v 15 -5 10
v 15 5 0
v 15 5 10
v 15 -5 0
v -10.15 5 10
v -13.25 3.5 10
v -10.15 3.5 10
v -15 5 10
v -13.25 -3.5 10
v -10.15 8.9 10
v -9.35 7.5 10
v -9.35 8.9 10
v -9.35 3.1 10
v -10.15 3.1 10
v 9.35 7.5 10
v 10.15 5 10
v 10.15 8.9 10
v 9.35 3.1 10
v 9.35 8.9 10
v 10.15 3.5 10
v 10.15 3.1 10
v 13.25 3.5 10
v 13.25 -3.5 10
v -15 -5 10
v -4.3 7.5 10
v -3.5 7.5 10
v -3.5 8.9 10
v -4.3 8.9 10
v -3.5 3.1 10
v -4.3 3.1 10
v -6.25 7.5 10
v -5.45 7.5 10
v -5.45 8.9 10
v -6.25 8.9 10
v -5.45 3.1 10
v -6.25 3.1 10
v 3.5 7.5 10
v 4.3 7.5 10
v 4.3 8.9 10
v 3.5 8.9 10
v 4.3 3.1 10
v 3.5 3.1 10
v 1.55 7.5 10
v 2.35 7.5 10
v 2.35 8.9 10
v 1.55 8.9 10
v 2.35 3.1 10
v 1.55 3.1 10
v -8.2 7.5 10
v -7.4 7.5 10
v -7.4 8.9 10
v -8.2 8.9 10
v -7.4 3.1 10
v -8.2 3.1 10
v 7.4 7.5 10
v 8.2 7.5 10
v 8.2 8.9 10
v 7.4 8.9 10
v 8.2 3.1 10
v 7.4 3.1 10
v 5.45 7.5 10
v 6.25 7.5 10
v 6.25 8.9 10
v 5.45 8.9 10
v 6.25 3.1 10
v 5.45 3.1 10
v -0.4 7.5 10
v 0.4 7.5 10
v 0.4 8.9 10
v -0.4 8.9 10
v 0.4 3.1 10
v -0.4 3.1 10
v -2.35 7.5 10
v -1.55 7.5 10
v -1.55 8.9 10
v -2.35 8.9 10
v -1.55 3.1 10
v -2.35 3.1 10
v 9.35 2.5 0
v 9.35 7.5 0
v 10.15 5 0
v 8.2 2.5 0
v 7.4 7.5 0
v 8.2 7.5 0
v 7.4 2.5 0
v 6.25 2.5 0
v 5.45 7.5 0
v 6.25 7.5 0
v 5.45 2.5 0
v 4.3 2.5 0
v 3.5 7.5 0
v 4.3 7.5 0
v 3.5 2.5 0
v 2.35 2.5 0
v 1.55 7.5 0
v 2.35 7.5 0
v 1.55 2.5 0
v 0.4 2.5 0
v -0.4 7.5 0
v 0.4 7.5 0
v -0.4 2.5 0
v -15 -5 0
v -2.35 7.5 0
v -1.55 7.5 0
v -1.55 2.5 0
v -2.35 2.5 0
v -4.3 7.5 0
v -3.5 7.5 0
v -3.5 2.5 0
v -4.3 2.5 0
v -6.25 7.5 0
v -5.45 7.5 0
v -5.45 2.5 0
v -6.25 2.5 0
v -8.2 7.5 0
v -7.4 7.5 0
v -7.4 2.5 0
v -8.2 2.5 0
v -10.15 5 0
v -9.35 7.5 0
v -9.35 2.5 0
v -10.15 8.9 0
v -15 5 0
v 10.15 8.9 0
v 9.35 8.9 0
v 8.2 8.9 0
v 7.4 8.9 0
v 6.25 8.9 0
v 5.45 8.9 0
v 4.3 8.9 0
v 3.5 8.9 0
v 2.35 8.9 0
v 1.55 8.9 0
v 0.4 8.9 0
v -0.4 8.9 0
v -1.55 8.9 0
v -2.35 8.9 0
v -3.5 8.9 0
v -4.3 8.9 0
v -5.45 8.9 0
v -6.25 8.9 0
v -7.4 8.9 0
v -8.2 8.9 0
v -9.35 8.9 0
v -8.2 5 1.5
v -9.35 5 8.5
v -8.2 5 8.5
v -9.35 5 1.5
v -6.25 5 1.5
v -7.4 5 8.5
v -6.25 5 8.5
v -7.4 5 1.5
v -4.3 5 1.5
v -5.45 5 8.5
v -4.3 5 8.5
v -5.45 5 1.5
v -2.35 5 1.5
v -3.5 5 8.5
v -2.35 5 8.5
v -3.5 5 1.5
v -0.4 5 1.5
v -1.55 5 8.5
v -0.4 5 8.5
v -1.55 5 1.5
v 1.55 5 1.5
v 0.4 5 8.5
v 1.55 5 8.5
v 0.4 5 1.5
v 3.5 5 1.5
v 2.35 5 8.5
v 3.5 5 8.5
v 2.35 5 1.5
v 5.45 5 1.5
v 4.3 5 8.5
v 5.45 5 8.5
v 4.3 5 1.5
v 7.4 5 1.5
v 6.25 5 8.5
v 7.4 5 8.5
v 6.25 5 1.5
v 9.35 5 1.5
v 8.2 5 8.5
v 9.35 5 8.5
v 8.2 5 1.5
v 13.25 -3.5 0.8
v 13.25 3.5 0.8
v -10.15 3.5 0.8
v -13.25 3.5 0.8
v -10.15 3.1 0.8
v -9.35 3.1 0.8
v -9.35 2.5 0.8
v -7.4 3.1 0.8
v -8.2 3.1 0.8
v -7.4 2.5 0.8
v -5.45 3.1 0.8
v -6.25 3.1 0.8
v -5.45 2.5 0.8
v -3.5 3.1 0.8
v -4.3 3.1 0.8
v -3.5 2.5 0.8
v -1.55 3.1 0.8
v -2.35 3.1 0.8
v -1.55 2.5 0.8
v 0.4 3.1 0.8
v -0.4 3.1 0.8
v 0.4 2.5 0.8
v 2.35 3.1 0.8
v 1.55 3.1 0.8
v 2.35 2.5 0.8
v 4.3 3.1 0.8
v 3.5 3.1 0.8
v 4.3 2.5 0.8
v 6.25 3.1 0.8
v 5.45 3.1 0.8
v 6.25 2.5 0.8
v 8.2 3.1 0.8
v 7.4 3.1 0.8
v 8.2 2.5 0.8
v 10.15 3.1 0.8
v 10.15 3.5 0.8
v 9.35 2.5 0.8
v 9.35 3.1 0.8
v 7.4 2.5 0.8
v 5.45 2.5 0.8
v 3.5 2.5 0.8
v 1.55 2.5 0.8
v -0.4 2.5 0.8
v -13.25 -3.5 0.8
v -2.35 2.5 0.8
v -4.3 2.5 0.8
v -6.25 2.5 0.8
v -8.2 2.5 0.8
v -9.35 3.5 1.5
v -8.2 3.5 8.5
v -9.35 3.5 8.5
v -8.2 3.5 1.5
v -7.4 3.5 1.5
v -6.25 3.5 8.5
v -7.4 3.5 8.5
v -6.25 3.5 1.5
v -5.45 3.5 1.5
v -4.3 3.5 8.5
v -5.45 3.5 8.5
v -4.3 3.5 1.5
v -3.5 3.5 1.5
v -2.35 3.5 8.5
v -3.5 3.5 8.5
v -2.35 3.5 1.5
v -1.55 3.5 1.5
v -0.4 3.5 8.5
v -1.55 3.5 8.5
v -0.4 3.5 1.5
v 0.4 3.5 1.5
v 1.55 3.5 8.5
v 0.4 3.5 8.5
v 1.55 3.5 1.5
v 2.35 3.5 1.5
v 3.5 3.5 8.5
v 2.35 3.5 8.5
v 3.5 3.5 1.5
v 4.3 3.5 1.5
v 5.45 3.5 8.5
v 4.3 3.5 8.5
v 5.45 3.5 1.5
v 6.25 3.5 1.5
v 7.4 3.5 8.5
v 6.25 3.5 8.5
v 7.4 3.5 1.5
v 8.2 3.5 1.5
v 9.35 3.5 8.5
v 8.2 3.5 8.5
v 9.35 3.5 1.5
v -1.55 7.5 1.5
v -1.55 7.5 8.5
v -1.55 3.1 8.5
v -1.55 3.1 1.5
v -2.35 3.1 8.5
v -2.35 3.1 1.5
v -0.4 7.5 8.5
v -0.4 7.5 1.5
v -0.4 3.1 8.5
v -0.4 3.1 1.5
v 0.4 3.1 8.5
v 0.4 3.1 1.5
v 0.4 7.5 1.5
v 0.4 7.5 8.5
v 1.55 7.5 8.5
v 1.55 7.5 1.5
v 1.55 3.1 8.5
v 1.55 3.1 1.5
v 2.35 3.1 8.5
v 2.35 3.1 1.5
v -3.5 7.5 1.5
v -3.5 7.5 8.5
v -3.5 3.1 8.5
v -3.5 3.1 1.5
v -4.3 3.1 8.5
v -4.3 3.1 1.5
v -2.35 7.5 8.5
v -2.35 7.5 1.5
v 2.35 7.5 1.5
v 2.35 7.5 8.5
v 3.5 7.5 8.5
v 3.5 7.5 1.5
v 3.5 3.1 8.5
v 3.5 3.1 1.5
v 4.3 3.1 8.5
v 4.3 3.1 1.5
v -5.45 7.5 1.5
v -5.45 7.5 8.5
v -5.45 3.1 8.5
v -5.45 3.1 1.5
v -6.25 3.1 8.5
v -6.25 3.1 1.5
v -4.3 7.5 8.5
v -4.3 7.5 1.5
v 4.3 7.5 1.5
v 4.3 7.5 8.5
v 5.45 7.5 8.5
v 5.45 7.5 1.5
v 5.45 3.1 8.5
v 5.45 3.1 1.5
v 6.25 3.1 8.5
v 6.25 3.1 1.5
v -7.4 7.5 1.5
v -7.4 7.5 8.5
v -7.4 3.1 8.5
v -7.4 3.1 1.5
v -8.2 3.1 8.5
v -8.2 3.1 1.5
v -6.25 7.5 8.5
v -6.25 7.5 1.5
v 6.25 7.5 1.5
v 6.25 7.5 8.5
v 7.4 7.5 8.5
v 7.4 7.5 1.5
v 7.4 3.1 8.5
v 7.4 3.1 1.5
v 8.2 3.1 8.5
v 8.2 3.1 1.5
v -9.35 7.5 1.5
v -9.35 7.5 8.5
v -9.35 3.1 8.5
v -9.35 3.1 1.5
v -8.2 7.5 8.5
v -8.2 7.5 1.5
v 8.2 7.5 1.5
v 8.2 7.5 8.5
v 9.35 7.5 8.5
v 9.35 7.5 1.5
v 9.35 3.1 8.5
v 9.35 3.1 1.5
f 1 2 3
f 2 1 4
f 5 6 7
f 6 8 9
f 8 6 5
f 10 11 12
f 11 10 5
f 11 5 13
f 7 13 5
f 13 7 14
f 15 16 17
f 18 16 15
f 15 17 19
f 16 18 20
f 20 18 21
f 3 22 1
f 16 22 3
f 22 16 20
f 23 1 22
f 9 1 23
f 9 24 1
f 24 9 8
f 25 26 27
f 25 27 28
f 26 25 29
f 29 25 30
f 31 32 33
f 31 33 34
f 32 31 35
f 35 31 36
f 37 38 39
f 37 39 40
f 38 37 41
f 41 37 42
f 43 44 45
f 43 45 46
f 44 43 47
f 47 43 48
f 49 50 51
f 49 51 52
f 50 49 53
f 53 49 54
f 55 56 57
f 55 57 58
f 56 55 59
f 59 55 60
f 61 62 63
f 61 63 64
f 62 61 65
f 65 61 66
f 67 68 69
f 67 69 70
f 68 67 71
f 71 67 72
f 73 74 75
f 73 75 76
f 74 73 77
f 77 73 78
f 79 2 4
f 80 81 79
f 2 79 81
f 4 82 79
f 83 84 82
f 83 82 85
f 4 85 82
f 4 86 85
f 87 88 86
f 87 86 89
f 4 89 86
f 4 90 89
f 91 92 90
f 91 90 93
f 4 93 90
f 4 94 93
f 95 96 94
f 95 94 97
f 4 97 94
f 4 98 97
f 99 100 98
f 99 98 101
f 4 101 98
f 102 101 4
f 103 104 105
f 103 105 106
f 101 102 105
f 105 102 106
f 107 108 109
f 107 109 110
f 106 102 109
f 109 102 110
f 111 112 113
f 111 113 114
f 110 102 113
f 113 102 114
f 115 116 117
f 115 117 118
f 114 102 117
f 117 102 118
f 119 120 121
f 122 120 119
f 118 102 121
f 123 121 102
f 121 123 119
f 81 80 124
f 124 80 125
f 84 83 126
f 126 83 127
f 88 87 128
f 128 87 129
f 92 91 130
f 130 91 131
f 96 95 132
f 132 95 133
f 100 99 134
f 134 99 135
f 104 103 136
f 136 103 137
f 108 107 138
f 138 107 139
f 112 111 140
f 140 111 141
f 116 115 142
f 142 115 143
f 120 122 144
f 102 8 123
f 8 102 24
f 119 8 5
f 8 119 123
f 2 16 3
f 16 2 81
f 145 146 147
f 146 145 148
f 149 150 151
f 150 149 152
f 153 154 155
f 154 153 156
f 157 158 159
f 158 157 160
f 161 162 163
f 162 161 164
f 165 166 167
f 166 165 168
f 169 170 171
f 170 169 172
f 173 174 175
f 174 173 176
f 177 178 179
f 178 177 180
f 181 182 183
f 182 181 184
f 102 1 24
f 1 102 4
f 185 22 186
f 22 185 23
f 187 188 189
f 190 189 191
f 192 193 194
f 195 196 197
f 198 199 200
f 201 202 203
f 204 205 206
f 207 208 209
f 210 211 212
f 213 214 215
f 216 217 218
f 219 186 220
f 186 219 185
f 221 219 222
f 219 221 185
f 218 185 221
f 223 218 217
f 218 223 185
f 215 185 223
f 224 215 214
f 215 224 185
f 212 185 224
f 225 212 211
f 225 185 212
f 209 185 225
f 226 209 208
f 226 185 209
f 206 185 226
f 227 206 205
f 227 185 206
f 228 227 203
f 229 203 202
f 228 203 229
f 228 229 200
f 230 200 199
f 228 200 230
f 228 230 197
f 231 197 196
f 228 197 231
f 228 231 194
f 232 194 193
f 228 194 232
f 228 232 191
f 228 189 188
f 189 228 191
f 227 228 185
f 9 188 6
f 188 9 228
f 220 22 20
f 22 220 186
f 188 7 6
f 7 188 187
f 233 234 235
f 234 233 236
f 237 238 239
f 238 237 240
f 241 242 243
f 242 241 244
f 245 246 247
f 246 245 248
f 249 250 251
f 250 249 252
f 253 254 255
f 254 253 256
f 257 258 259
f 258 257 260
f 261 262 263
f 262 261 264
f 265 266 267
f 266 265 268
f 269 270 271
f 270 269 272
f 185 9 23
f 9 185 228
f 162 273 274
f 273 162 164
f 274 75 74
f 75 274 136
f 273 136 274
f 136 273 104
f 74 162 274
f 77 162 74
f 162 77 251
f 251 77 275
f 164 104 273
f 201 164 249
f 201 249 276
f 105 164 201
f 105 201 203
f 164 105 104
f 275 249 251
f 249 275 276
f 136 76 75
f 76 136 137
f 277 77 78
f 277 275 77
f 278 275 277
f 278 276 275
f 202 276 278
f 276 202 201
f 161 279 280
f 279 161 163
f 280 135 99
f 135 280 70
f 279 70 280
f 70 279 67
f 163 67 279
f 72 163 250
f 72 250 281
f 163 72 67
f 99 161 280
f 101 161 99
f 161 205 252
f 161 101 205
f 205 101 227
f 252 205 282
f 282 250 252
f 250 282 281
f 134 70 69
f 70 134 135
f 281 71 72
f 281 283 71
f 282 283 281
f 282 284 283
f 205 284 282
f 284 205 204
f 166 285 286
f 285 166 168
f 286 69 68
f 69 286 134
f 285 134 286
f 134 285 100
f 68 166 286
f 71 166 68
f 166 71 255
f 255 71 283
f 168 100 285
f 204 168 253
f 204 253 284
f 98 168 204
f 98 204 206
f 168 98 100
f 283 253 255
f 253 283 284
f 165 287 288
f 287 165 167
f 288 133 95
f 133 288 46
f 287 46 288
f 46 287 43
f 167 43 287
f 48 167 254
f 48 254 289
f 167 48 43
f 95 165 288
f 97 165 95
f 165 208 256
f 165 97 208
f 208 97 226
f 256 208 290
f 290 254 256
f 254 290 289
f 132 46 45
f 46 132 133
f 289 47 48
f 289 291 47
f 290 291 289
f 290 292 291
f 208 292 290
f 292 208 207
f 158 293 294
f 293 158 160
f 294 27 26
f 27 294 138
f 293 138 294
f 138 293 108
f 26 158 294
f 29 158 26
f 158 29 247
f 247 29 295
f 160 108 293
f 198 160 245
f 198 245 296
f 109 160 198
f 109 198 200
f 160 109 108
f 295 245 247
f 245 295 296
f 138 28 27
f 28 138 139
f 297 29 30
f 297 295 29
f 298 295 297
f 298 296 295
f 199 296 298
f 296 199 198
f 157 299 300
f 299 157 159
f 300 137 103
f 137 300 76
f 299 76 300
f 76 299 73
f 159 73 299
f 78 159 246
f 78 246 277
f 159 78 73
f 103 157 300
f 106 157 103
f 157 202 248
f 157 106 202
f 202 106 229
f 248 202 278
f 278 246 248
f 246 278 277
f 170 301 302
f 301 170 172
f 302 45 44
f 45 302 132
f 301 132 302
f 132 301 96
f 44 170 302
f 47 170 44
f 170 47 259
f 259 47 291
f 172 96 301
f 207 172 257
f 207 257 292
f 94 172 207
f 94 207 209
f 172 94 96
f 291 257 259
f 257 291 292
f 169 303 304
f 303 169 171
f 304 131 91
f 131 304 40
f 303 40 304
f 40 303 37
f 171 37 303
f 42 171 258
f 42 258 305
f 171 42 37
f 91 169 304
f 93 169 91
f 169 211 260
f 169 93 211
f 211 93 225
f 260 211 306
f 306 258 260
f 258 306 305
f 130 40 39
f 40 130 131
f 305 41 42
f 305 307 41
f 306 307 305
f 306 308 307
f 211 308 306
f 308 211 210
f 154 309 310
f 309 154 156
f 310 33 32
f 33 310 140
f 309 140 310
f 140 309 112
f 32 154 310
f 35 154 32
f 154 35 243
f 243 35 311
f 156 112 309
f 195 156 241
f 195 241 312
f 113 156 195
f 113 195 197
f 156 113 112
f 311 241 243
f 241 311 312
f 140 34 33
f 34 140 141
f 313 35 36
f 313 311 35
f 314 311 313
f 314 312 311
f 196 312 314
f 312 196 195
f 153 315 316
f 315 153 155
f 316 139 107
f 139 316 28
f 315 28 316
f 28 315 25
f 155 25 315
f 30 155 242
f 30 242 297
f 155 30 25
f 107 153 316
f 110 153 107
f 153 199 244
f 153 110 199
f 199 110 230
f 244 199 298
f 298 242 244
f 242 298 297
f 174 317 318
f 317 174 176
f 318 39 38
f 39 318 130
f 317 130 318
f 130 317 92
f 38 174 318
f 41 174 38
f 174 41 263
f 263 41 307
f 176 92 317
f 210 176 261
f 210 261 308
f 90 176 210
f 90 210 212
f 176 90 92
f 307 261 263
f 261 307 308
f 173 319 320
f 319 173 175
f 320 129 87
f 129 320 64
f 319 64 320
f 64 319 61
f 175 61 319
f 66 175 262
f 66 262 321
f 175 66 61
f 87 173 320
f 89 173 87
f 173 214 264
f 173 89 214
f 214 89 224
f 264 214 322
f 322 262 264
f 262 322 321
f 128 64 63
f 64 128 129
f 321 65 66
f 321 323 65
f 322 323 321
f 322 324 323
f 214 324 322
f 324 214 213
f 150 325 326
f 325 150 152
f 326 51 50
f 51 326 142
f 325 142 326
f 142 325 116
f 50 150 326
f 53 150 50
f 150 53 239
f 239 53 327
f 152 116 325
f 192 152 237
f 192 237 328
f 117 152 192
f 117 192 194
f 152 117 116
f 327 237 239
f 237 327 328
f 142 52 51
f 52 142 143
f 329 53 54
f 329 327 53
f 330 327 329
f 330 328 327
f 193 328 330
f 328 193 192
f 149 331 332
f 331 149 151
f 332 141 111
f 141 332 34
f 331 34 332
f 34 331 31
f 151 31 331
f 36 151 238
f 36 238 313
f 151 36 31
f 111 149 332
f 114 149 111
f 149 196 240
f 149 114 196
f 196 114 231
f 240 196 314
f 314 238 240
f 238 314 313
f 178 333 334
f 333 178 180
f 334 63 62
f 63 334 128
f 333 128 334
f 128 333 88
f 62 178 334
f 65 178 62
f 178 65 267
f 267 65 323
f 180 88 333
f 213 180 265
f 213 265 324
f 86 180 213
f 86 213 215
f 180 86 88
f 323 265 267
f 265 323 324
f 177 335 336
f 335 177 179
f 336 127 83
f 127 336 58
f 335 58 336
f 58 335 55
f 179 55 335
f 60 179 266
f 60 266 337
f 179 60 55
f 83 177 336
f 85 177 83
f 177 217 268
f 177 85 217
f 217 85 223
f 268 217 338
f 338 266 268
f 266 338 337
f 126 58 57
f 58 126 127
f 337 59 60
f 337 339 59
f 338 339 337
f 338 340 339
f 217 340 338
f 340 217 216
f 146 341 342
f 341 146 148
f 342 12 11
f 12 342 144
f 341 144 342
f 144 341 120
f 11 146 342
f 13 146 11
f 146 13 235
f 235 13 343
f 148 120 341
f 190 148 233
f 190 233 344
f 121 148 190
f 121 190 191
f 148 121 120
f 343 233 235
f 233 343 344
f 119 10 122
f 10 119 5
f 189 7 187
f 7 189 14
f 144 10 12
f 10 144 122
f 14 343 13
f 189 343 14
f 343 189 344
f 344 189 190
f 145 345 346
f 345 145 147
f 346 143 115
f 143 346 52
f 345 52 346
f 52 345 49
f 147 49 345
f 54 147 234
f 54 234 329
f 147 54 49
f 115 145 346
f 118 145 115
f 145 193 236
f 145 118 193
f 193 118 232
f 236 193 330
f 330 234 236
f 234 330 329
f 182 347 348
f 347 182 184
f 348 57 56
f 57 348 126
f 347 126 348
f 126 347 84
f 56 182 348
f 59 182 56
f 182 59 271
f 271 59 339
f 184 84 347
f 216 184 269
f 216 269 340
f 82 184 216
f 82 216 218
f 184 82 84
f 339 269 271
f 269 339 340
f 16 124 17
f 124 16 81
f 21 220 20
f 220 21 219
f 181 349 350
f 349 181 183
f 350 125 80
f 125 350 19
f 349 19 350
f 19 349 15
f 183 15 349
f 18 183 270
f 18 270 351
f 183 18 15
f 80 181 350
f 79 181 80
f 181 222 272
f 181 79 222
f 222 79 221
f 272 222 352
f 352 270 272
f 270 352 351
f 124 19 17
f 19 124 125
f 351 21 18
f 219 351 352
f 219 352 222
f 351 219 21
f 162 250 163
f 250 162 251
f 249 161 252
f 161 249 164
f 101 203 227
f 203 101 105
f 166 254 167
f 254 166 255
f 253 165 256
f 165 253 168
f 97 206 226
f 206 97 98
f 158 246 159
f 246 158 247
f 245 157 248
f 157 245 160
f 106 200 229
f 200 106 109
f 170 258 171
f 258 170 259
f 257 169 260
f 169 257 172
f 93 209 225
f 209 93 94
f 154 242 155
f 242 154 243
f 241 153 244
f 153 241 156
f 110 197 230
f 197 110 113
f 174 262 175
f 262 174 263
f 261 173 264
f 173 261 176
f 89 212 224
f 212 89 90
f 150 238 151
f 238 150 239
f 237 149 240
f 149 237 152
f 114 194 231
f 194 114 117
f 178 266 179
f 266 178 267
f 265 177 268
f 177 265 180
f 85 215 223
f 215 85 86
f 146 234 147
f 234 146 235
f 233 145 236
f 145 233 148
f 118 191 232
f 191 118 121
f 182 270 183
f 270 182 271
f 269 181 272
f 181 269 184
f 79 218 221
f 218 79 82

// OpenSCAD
/*
 * ppk_usb
 *
 * Copyright (C) 2014 cy384
 * All rights reserved.
 *
 * This software may be modified and distributed under the terms
 * of the BSD license. See the LICENSE file for details.
 */

// 3d printable adapter for palm-III era devices

module main_hull()
{
	cube(size = [30.00, 10.00, 10.00], center = true);
}

module socket()
{
	translate ([0, 0, 3.30])
	{
		cube(size = [26.50, 7.00, 15.00], center = true);
	};
}

module pin()
{
	translate([-1.95/2, 0, 0])
	{
		cube(size = [1.95, 1.00, 10.00], center = false);
	}

	translate([(-1.95/2)-0.4, -0.40, 0])
	{
		cube(size = [0.80, 5.80, 10.00], center = false);
	}

	translate([(+1.95/2)-0.4, -0.40, 0])
	{
		cube(size = [0.80, 5.80, 10.00], center = false);
	}
}

module hole()
{
	translate([0, 5.00, 10.00])
	{
		cube(size = [1.15, 5.00, 3.00], center = true);
	}

	translate([0, 5.00, 0.00])
	{
		cube(size = [1.15, 5.00, 3.00], center = true);
	}
}

module palm_iii_adapter()
{
	difference()
	{
		union()
		{
			// main body
			translate([0, 0, 5.00]) difference()
			{
				main_hull();
				socket();
			}

			// space for each pin
			for (i = [0 : 4])
			{
				translate([-((1.95/2)+(1.95*i)), 3.5, 0]) pin();
				translate([(1.95/2)+(1.95*i), 3.5, 0]) pin();
			}
		}

		// make holes for the contacts
		for (i = [0 : 4])
		{
			translate([-((1.95/2)+(1.95*i)), 0, 0]) hole();
			translate([(1.95/2)+(1.95*i), 0, 0]) hole();
		}
	}
}

palm_iii_adapter();
